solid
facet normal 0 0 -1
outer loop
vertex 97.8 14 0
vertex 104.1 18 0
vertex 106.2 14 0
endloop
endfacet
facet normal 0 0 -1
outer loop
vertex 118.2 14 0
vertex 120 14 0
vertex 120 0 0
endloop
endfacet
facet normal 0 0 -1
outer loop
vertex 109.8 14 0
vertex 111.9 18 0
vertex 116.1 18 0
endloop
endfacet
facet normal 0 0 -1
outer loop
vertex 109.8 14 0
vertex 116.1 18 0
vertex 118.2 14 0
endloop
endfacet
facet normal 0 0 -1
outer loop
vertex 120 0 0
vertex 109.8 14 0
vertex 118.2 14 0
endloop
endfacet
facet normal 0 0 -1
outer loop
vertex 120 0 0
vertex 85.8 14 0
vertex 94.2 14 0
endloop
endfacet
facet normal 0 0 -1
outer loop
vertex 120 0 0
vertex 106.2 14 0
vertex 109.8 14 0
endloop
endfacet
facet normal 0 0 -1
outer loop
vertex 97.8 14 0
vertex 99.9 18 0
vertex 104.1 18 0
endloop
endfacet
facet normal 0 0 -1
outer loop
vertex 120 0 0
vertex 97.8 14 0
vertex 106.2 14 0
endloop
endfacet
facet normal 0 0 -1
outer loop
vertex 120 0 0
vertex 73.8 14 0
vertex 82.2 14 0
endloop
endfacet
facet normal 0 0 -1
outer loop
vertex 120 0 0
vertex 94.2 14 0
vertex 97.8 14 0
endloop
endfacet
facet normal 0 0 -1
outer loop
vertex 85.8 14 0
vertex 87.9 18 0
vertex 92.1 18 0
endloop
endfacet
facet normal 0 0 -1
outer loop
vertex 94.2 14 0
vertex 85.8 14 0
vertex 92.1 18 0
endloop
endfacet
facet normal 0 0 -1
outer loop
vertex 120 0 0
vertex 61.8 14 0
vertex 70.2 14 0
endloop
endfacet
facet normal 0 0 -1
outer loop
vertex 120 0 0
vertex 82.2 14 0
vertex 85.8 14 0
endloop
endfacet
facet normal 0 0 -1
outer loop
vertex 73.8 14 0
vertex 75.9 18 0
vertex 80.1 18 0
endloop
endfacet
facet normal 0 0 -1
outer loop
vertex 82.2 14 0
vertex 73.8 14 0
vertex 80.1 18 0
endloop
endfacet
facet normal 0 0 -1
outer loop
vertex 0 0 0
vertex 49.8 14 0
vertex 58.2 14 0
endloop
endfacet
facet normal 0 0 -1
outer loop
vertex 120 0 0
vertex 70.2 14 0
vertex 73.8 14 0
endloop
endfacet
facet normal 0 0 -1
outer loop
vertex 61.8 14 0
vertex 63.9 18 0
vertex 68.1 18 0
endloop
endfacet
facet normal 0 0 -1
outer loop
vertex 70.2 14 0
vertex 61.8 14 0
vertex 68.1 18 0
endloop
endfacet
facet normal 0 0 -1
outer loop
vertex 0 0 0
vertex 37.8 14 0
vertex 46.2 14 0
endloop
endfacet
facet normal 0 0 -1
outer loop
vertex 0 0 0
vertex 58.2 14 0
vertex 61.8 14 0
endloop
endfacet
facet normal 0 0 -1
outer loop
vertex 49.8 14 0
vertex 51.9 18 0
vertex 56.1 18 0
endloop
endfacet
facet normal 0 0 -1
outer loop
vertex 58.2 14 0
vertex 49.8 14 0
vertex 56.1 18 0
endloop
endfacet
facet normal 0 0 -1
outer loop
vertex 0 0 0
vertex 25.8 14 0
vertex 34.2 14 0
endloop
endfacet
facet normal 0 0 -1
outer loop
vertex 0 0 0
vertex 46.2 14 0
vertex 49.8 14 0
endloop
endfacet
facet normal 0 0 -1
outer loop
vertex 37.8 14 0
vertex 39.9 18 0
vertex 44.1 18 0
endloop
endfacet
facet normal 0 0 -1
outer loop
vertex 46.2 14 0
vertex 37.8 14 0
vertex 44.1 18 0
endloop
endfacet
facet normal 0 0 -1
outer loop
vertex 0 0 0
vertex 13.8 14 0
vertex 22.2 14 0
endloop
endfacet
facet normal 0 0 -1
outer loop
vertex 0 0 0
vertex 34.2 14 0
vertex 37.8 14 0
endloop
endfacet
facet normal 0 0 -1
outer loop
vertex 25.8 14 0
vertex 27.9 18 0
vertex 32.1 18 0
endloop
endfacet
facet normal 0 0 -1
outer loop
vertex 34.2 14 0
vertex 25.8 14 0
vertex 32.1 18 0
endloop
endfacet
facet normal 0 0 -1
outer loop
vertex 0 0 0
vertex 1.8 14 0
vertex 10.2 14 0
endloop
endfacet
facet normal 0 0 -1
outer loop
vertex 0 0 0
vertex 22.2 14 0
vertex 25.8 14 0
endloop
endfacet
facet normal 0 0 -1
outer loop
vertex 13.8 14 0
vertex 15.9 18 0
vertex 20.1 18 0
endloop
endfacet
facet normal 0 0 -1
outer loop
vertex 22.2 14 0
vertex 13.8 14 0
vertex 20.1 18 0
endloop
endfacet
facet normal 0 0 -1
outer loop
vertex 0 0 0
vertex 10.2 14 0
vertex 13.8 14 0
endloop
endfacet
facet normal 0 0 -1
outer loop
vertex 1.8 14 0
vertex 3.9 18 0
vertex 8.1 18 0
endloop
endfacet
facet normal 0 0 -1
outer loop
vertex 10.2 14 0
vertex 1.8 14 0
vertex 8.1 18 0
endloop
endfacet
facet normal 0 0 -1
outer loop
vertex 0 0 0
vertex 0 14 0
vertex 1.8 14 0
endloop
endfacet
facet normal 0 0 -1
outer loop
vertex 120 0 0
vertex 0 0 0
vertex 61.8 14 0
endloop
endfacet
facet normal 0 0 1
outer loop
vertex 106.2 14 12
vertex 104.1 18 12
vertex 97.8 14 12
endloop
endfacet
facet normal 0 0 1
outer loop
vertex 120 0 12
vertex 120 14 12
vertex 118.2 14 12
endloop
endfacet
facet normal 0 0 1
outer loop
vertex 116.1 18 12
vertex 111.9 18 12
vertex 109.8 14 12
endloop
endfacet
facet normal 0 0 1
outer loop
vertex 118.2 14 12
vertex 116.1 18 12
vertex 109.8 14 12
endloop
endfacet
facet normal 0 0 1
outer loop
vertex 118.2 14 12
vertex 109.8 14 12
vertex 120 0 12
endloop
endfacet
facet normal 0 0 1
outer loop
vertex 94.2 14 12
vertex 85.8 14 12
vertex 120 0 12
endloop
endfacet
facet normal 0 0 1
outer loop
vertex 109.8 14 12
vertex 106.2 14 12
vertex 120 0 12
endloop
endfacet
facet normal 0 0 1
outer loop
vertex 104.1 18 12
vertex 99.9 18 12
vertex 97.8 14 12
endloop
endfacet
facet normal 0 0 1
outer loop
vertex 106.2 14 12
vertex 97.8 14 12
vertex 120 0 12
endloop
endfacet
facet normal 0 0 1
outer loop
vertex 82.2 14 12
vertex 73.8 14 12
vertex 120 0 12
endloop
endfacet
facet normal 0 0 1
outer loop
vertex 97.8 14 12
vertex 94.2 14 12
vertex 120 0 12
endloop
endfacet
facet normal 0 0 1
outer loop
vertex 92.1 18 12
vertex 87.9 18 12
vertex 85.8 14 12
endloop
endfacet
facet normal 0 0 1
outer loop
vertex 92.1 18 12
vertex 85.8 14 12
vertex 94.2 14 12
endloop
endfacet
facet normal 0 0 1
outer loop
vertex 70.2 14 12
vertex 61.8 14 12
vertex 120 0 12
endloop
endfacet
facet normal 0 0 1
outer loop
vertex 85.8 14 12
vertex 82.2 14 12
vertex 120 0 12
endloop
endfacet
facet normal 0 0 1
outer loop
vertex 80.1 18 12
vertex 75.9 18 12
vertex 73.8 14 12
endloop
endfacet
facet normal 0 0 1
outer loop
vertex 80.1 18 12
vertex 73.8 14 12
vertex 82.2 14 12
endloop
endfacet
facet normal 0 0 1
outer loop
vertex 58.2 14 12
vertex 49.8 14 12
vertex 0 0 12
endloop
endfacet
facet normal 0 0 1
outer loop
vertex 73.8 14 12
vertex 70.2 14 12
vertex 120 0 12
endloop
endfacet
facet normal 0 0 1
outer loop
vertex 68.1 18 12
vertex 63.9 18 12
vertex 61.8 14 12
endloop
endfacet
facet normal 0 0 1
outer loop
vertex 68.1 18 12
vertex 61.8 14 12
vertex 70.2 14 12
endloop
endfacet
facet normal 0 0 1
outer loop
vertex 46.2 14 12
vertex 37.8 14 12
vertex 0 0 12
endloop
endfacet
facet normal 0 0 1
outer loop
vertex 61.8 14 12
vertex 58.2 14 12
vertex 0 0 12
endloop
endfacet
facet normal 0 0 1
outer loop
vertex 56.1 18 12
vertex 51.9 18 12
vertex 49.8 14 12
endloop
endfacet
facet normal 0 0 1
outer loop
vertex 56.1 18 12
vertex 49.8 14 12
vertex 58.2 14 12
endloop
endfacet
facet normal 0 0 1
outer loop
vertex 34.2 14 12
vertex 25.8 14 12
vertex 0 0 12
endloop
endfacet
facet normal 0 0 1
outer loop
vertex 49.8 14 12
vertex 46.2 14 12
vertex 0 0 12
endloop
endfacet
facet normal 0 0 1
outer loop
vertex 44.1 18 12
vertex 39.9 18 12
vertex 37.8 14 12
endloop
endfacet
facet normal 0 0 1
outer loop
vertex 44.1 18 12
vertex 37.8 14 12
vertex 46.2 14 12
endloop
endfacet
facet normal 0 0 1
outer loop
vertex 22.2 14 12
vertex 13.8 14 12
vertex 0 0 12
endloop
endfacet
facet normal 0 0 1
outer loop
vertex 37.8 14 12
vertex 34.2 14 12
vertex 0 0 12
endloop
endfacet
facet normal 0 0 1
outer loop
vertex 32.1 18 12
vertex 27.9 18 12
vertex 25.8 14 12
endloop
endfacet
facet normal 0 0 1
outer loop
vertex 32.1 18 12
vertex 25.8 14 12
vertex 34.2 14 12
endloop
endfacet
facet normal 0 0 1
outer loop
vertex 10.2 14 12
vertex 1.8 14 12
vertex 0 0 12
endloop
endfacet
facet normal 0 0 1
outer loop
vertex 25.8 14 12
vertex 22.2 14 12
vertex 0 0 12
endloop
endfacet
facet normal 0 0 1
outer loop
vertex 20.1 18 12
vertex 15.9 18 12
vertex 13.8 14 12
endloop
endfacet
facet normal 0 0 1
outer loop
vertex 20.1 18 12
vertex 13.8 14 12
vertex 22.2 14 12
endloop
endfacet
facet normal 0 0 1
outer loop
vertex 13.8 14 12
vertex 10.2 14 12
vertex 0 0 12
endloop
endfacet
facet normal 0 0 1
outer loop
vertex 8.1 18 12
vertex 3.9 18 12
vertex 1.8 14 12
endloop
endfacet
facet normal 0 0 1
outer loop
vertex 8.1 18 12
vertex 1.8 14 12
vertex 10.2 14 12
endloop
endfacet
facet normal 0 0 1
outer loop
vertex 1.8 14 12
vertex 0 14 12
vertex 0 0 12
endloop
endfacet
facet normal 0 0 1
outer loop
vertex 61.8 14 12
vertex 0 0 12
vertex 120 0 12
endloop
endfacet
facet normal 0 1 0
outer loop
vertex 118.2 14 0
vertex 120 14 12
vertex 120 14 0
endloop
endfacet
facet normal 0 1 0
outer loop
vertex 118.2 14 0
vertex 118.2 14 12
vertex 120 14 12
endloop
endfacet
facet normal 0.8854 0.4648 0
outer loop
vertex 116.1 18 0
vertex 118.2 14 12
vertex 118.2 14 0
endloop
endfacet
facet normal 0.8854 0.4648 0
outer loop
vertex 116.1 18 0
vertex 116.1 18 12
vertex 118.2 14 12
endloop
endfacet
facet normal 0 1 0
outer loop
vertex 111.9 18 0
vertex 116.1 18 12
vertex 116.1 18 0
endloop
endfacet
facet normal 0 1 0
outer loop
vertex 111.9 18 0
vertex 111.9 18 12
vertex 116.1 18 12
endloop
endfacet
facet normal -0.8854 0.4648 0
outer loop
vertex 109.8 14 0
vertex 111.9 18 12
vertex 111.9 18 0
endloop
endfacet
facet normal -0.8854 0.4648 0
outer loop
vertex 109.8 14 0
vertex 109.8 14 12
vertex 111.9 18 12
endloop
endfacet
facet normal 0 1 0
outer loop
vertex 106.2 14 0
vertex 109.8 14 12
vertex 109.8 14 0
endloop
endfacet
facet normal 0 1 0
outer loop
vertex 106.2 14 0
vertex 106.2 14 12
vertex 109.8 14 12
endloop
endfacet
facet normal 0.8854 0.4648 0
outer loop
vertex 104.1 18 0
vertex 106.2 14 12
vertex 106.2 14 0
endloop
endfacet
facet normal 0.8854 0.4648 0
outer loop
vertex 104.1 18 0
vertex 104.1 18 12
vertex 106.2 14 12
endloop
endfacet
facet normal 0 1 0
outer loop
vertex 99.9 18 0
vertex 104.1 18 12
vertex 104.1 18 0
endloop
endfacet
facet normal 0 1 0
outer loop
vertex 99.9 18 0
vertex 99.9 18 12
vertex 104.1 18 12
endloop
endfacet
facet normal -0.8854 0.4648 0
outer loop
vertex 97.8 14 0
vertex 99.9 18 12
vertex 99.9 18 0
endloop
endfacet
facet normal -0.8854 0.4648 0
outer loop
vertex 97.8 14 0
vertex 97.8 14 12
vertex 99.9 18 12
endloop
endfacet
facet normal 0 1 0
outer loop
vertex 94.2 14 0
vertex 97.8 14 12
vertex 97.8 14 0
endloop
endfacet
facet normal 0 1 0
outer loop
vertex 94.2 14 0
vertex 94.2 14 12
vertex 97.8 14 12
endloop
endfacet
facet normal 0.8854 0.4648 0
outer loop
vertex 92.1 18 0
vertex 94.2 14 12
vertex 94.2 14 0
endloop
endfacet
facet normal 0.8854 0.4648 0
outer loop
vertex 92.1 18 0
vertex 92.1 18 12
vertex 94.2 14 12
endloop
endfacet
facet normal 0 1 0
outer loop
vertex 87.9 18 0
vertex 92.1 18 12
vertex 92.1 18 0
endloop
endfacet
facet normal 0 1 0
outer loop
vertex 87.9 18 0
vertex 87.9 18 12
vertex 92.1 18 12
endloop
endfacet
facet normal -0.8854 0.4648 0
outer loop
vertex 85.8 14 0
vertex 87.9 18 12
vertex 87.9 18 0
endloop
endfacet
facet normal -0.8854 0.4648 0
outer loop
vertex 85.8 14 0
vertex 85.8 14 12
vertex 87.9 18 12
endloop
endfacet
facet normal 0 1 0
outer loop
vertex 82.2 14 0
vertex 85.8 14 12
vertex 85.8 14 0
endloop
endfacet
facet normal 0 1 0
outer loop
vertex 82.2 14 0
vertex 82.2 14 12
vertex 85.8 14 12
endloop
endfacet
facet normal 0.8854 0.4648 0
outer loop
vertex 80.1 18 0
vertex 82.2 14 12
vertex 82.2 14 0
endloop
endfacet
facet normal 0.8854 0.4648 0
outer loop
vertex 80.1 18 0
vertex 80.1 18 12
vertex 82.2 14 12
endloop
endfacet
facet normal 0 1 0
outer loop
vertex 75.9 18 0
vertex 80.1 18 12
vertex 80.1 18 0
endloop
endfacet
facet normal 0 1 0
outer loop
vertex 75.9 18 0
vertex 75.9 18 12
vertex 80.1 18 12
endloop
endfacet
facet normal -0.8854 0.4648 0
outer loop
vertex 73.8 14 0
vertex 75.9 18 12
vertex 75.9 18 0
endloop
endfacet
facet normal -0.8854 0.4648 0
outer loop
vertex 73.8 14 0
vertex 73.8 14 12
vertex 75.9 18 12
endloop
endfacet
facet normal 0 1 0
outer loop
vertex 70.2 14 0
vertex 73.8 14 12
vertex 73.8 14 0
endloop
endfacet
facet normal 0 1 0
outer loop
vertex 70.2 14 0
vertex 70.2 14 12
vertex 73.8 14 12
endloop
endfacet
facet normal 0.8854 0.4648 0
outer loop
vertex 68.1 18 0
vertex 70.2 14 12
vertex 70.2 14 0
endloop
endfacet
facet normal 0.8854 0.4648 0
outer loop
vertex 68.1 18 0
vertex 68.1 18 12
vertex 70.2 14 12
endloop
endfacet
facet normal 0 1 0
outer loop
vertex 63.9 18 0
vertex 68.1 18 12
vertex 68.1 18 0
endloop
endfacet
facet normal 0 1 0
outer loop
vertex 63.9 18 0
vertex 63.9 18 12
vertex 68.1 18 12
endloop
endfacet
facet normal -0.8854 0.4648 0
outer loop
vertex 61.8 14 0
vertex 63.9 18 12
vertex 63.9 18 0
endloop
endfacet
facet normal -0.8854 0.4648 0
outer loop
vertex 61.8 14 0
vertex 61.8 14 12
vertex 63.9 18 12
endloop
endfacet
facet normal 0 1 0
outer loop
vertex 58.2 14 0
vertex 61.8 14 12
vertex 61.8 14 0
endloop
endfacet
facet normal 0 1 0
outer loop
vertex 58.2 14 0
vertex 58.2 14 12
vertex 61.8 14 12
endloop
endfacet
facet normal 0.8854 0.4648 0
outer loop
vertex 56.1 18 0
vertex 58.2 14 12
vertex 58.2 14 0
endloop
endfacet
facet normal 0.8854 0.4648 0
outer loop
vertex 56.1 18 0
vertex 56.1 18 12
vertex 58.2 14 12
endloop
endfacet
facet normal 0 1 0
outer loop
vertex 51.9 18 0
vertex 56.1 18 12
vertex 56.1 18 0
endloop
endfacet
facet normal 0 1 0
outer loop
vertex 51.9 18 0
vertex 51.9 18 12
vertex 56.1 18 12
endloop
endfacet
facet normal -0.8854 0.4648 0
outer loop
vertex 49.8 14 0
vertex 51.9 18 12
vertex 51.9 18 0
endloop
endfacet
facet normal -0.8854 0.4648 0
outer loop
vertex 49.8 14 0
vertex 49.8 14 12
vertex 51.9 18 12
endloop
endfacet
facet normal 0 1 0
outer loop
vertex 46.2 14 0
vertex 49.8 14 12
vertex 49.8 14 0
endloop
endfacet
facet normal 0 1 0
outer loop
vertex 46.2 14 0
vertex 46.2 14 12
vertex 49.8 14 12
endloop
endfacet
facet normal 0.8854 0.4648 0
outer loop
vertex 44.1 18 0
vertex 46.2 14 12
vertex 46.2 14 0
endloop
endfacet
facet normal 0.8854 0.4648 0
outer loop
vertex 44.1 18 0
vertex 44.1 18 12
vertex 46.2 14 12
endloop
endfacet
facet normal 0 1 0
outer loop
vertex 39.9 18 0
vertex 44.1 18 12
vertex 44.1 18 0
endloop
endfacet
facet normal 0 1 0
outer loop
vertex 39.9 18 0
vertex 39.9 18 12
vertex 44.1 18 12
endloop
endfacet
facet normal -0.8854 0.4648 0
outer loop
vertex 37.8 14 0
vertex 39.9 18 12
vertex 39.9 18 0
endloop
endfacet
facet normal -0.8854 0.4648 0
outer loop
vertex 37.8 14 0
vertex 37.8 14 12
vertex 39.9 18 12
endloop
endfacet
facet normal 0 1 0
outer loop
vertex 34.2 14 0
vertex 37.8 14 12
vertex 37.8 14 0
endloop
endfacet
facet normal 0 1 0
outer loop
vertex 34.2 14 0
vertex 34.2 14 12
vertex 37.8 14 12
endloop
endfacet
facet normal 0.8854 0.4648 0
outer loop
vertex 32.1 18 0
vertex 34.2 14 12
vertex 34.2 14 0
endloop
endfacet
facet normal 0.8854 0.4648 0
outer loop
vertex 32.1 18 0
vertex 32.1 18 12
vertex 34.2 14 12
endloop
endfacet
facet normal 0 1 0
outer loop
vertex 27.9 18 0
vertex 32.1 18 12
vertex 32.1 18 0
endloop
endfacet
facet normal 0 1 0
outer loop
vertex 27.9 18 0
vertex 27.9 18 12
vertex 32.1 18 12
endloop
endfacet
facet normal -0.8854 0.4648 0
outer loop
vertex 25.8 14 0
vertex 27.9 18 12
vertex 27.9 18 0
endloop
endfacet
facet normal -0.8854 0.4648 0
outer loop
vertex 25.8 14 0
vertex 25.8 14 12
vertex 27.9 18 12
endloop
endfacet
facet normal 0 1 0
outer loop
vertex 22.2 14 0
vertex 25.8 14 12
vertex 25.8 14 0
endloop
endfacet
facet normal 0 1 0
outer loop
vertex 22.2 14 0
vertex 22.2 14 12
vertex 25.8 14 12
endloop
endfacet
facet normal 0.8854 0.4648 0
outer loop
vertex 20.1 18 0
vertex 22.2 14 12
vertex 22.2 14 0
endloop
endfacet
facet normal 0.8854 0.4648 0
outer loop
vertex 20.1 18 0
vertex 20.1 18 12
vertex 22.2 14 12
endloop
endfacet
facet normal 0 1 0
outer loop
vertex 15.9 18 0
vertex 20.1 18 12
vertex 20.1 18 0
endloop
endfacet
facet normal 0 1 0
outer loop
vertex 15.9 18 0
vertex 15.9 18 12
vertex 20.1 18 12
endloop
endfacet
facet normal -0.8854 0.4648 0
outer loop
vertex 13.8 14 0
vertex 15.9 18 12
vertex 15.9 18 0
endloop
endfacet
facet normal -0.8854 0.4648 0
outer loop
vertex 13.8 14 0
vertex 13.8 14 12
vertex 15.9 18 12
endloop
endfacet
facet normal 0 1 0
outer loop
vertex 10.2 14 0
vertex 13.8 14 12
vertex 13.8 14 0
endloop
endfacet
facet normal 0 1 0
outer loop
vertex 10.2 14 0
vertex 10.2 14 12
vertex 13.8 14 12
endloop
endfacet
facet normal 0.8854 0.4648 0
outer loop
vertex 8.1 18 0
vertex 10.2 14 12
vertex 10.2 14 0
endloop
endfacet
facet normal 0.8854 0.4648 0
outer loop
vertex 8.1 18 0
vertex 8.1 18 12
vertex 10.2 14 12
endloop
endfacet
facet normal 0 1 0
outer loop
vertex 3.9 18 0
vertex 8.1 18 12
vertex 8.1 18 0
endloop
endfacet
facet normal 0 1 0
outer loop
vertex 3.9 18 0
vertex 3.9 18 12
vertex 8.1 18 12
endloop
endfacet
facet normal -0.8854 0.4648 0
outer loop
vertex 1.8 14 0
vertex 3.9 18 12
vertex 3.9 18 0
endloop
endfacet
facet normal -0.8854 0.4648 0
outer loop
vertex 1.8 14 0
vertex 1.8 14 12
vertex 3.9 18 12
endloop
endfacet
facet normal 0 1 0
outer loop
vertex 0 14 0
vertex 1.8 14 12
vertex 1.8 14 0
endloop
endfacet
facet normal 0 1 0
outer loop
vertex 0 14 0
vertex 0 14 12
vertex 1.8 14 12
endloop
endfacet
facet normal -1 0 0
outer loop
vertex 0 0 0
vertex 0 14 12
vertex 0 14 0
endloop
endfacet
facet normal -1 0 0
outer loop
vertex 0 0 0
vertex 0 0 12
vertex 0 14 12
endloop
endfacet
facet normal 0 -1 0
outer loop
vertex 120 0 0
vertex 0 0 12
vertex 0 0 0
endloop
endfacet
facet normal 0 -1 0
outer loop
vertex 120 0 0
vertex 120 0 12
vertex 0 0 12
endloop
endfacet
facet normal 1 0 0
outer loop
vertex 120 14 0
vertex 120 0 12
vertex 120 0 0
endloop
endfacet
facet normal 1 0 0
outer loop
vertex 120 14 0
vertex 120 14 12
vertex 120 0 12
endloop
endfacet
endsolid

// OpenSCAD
$fn = 32;

// ----------------------------------------------------------------------
// Gear rack: 10 teeth, pitch 12 mm
// ----------------------------------------------------------------------

// --- parameters (mm) ---
teeth = 10;               // number of teeth
pitch = 12;               // tooth pitch, X
root_w = 8.4;             // tooth width at the root
tip_w = 4.2;              // tooth width at the tip
base_h = 14;              // rack body height, Y
tooth_h = 4;              // tooth height above the body
plate_t = 12;             // rack width, Z (extrusion height)
fit_tol = 0.1;            // declared fit tolerance (prompt contract)
free_tol = 0.5;           // declared free tolerance (prompt contract)

rack_l = teeth * pitch;  // overall length
total_h = base_h + tooth_h;  // overall height

profile = [[0, 0], [120, 0], [120, 14], [118.2, 14], [116.1, 18], [111.9, 18], [109.8, 14], [106.2, 14], [104.1, 18], [99.9, 18], [97.8, 14], [94.2, 14], [92.1, 18], [87.9, 18], [85.8, 14], [82.2, 14], [80.1, 18], [75.9, 18], [73.8, 14], [70.2, 14], [68.1, 18], [63.9, 18], [61.8, 14], [58.2, 14], [56.1, 18], [51.9, 18], [49.8, 14], [46.2, 14], [44.1, 18], [39.9, 18], [37.8, 14], [34.2, 14], [32.1, 18], [27.9, 18], [25.8, 14], [22.2, 14], [20.1, 18], [15.9, 18], [13.8, 14], [10.2, 14], [8.1, 18], [3.9, 18], [1.8, 14], [0, 14]];  // primary outline, 44 points, counter clockwise

// --- the one profile operation ---
linear_extrude(height = plate_t) polygon(points = profile);
